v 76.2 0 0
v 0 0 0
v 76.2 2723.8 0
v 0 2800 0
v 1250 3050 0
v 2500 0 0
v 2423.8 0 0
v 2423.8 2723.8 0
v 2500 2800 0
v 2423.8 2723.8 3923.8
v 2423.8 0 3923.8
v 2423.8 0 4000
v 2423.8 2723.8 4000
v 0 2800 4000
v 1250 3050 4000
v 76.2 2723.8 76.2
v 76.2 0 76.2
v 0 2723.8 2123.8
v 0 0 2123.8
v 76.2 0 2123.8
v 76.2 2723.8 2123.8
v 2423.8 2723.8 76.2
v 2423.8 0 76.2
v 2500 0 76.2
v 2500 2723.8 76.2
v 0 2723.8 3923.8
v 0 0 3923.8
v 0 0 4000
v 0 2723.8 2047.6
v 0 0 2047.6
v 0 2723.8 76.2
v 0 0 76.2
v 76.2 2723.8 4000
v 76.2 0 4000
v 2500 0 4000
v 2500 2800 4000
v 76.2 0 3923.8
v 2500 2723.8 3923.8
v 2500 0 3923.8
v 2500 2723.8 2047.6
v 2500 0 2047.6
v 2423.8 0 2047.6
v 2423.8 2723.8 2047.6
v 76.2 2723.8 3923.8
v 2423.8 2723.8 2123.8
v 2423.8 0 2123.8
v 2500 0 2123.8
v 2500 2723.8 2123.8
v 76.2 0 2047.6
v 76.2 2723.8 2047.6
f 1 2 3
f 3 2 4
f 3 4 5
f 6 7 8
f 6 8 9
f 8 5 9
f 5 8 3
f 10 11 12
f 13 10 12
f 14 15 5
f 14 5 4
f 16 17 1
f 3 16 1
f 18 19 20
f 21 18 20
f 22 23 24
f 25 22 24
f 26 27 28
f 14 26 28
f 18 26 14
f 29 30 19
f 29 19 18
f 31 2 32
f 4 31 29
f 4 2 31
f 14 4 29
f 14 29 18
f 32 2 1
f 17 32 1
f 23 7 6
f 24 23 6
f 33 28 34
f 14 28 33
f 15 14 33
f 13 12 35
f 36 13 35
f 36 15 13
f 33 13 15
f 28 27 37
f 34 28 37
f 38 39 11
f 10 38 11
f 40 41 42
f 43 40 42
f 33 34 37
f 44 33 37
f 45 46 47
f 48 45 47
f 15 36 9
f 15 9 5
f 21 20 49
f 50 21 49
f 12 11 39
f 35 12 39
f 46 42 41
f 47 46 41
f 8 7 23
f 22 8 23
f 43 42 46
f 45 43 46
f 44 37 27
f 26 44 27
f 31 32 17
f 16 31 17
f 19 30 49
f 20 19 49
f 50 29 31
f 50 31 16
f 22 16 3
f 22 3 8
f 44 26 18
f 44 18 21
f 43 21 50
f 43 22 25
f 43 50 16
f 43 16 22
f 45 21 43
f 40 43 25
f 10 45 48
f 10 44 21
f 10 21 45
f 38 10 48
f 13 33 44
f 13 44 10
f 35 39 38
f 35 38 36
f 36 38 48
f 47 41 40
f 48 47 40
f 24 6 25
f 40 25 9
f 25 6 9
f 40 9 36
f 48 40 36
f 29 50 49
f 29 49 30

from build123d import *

# Parameters (mm, degrees)
CROQUIS1_W              = 2500
CROQUIS1_H              = 2800
SALIENTE_EXTRUIR1_DEPTH = 4000
CORTAR_EXTRUIR1_DEPTH   = 2723.8
CORTAR_EXTRUIR2_DEPTH   = 2723.8
SALIENTE_EXTRUIR2_DEPTH = 4000


with BuildPart() as part:
    # Croquis1 → Saliente-Extruir1 (new body)
    with BuildSketch(Plane.XY):
        with Locations((1250, 1400)):
            Rectangle(CROQUIS1_W, CROQUIS1_H)
    extrude(amount=SALIENTE_EXTRUIR1_DEPTH)

    # Croquis2 → Cortar-Extruir1 (cut)
    with BuildSketch(Plane.XZ):
        Polygon((76.2, 4000), (76.2, 3923.8), (0, 3923.8), (0, 2123.8), (76.2, 2123.8), (76.2, 2047.6), (2423.8, 2047.6), (2423.8, 2123.8), (2500, 2123.8), (2500, 3923.8), (2423.8, 3923.8), (2423.8, 4000), align=None)
    extrude(amount=-CORTAR_EXTRUIR1_DEPTH, mode=Mode.SUBTRACT)

    # Croquis3 → Cortar-Extruir2 (cut)
    with BuildSketch(Plane.XZ):
        Polygon((0, 76.2), (76.2, 76.2), (76.2, 0), (2423.8, 0), (2423.8, 76.2), (2500, 76.2), (2500, 2047.6), (0, 2047.6), align=None)
    extrude(amount=-CORTAR_EXTRUIR2_DEPTH, mode=Mode.SUBTRACT)

    # Croquis4 → Saliente-Extruir2 (add)
    with BuildSketch(Plane(origin=(0, 0, 0), x_dir=(-1, 0, 0), z_dir=(0, 0, -1))):
        Polygon((-2500, 2800), (-1250, 3050), (0, 2800), align=None)
    extrude(amount=-SALIENTE_EXTRUIR2_DEPTH)


solid = part.part
